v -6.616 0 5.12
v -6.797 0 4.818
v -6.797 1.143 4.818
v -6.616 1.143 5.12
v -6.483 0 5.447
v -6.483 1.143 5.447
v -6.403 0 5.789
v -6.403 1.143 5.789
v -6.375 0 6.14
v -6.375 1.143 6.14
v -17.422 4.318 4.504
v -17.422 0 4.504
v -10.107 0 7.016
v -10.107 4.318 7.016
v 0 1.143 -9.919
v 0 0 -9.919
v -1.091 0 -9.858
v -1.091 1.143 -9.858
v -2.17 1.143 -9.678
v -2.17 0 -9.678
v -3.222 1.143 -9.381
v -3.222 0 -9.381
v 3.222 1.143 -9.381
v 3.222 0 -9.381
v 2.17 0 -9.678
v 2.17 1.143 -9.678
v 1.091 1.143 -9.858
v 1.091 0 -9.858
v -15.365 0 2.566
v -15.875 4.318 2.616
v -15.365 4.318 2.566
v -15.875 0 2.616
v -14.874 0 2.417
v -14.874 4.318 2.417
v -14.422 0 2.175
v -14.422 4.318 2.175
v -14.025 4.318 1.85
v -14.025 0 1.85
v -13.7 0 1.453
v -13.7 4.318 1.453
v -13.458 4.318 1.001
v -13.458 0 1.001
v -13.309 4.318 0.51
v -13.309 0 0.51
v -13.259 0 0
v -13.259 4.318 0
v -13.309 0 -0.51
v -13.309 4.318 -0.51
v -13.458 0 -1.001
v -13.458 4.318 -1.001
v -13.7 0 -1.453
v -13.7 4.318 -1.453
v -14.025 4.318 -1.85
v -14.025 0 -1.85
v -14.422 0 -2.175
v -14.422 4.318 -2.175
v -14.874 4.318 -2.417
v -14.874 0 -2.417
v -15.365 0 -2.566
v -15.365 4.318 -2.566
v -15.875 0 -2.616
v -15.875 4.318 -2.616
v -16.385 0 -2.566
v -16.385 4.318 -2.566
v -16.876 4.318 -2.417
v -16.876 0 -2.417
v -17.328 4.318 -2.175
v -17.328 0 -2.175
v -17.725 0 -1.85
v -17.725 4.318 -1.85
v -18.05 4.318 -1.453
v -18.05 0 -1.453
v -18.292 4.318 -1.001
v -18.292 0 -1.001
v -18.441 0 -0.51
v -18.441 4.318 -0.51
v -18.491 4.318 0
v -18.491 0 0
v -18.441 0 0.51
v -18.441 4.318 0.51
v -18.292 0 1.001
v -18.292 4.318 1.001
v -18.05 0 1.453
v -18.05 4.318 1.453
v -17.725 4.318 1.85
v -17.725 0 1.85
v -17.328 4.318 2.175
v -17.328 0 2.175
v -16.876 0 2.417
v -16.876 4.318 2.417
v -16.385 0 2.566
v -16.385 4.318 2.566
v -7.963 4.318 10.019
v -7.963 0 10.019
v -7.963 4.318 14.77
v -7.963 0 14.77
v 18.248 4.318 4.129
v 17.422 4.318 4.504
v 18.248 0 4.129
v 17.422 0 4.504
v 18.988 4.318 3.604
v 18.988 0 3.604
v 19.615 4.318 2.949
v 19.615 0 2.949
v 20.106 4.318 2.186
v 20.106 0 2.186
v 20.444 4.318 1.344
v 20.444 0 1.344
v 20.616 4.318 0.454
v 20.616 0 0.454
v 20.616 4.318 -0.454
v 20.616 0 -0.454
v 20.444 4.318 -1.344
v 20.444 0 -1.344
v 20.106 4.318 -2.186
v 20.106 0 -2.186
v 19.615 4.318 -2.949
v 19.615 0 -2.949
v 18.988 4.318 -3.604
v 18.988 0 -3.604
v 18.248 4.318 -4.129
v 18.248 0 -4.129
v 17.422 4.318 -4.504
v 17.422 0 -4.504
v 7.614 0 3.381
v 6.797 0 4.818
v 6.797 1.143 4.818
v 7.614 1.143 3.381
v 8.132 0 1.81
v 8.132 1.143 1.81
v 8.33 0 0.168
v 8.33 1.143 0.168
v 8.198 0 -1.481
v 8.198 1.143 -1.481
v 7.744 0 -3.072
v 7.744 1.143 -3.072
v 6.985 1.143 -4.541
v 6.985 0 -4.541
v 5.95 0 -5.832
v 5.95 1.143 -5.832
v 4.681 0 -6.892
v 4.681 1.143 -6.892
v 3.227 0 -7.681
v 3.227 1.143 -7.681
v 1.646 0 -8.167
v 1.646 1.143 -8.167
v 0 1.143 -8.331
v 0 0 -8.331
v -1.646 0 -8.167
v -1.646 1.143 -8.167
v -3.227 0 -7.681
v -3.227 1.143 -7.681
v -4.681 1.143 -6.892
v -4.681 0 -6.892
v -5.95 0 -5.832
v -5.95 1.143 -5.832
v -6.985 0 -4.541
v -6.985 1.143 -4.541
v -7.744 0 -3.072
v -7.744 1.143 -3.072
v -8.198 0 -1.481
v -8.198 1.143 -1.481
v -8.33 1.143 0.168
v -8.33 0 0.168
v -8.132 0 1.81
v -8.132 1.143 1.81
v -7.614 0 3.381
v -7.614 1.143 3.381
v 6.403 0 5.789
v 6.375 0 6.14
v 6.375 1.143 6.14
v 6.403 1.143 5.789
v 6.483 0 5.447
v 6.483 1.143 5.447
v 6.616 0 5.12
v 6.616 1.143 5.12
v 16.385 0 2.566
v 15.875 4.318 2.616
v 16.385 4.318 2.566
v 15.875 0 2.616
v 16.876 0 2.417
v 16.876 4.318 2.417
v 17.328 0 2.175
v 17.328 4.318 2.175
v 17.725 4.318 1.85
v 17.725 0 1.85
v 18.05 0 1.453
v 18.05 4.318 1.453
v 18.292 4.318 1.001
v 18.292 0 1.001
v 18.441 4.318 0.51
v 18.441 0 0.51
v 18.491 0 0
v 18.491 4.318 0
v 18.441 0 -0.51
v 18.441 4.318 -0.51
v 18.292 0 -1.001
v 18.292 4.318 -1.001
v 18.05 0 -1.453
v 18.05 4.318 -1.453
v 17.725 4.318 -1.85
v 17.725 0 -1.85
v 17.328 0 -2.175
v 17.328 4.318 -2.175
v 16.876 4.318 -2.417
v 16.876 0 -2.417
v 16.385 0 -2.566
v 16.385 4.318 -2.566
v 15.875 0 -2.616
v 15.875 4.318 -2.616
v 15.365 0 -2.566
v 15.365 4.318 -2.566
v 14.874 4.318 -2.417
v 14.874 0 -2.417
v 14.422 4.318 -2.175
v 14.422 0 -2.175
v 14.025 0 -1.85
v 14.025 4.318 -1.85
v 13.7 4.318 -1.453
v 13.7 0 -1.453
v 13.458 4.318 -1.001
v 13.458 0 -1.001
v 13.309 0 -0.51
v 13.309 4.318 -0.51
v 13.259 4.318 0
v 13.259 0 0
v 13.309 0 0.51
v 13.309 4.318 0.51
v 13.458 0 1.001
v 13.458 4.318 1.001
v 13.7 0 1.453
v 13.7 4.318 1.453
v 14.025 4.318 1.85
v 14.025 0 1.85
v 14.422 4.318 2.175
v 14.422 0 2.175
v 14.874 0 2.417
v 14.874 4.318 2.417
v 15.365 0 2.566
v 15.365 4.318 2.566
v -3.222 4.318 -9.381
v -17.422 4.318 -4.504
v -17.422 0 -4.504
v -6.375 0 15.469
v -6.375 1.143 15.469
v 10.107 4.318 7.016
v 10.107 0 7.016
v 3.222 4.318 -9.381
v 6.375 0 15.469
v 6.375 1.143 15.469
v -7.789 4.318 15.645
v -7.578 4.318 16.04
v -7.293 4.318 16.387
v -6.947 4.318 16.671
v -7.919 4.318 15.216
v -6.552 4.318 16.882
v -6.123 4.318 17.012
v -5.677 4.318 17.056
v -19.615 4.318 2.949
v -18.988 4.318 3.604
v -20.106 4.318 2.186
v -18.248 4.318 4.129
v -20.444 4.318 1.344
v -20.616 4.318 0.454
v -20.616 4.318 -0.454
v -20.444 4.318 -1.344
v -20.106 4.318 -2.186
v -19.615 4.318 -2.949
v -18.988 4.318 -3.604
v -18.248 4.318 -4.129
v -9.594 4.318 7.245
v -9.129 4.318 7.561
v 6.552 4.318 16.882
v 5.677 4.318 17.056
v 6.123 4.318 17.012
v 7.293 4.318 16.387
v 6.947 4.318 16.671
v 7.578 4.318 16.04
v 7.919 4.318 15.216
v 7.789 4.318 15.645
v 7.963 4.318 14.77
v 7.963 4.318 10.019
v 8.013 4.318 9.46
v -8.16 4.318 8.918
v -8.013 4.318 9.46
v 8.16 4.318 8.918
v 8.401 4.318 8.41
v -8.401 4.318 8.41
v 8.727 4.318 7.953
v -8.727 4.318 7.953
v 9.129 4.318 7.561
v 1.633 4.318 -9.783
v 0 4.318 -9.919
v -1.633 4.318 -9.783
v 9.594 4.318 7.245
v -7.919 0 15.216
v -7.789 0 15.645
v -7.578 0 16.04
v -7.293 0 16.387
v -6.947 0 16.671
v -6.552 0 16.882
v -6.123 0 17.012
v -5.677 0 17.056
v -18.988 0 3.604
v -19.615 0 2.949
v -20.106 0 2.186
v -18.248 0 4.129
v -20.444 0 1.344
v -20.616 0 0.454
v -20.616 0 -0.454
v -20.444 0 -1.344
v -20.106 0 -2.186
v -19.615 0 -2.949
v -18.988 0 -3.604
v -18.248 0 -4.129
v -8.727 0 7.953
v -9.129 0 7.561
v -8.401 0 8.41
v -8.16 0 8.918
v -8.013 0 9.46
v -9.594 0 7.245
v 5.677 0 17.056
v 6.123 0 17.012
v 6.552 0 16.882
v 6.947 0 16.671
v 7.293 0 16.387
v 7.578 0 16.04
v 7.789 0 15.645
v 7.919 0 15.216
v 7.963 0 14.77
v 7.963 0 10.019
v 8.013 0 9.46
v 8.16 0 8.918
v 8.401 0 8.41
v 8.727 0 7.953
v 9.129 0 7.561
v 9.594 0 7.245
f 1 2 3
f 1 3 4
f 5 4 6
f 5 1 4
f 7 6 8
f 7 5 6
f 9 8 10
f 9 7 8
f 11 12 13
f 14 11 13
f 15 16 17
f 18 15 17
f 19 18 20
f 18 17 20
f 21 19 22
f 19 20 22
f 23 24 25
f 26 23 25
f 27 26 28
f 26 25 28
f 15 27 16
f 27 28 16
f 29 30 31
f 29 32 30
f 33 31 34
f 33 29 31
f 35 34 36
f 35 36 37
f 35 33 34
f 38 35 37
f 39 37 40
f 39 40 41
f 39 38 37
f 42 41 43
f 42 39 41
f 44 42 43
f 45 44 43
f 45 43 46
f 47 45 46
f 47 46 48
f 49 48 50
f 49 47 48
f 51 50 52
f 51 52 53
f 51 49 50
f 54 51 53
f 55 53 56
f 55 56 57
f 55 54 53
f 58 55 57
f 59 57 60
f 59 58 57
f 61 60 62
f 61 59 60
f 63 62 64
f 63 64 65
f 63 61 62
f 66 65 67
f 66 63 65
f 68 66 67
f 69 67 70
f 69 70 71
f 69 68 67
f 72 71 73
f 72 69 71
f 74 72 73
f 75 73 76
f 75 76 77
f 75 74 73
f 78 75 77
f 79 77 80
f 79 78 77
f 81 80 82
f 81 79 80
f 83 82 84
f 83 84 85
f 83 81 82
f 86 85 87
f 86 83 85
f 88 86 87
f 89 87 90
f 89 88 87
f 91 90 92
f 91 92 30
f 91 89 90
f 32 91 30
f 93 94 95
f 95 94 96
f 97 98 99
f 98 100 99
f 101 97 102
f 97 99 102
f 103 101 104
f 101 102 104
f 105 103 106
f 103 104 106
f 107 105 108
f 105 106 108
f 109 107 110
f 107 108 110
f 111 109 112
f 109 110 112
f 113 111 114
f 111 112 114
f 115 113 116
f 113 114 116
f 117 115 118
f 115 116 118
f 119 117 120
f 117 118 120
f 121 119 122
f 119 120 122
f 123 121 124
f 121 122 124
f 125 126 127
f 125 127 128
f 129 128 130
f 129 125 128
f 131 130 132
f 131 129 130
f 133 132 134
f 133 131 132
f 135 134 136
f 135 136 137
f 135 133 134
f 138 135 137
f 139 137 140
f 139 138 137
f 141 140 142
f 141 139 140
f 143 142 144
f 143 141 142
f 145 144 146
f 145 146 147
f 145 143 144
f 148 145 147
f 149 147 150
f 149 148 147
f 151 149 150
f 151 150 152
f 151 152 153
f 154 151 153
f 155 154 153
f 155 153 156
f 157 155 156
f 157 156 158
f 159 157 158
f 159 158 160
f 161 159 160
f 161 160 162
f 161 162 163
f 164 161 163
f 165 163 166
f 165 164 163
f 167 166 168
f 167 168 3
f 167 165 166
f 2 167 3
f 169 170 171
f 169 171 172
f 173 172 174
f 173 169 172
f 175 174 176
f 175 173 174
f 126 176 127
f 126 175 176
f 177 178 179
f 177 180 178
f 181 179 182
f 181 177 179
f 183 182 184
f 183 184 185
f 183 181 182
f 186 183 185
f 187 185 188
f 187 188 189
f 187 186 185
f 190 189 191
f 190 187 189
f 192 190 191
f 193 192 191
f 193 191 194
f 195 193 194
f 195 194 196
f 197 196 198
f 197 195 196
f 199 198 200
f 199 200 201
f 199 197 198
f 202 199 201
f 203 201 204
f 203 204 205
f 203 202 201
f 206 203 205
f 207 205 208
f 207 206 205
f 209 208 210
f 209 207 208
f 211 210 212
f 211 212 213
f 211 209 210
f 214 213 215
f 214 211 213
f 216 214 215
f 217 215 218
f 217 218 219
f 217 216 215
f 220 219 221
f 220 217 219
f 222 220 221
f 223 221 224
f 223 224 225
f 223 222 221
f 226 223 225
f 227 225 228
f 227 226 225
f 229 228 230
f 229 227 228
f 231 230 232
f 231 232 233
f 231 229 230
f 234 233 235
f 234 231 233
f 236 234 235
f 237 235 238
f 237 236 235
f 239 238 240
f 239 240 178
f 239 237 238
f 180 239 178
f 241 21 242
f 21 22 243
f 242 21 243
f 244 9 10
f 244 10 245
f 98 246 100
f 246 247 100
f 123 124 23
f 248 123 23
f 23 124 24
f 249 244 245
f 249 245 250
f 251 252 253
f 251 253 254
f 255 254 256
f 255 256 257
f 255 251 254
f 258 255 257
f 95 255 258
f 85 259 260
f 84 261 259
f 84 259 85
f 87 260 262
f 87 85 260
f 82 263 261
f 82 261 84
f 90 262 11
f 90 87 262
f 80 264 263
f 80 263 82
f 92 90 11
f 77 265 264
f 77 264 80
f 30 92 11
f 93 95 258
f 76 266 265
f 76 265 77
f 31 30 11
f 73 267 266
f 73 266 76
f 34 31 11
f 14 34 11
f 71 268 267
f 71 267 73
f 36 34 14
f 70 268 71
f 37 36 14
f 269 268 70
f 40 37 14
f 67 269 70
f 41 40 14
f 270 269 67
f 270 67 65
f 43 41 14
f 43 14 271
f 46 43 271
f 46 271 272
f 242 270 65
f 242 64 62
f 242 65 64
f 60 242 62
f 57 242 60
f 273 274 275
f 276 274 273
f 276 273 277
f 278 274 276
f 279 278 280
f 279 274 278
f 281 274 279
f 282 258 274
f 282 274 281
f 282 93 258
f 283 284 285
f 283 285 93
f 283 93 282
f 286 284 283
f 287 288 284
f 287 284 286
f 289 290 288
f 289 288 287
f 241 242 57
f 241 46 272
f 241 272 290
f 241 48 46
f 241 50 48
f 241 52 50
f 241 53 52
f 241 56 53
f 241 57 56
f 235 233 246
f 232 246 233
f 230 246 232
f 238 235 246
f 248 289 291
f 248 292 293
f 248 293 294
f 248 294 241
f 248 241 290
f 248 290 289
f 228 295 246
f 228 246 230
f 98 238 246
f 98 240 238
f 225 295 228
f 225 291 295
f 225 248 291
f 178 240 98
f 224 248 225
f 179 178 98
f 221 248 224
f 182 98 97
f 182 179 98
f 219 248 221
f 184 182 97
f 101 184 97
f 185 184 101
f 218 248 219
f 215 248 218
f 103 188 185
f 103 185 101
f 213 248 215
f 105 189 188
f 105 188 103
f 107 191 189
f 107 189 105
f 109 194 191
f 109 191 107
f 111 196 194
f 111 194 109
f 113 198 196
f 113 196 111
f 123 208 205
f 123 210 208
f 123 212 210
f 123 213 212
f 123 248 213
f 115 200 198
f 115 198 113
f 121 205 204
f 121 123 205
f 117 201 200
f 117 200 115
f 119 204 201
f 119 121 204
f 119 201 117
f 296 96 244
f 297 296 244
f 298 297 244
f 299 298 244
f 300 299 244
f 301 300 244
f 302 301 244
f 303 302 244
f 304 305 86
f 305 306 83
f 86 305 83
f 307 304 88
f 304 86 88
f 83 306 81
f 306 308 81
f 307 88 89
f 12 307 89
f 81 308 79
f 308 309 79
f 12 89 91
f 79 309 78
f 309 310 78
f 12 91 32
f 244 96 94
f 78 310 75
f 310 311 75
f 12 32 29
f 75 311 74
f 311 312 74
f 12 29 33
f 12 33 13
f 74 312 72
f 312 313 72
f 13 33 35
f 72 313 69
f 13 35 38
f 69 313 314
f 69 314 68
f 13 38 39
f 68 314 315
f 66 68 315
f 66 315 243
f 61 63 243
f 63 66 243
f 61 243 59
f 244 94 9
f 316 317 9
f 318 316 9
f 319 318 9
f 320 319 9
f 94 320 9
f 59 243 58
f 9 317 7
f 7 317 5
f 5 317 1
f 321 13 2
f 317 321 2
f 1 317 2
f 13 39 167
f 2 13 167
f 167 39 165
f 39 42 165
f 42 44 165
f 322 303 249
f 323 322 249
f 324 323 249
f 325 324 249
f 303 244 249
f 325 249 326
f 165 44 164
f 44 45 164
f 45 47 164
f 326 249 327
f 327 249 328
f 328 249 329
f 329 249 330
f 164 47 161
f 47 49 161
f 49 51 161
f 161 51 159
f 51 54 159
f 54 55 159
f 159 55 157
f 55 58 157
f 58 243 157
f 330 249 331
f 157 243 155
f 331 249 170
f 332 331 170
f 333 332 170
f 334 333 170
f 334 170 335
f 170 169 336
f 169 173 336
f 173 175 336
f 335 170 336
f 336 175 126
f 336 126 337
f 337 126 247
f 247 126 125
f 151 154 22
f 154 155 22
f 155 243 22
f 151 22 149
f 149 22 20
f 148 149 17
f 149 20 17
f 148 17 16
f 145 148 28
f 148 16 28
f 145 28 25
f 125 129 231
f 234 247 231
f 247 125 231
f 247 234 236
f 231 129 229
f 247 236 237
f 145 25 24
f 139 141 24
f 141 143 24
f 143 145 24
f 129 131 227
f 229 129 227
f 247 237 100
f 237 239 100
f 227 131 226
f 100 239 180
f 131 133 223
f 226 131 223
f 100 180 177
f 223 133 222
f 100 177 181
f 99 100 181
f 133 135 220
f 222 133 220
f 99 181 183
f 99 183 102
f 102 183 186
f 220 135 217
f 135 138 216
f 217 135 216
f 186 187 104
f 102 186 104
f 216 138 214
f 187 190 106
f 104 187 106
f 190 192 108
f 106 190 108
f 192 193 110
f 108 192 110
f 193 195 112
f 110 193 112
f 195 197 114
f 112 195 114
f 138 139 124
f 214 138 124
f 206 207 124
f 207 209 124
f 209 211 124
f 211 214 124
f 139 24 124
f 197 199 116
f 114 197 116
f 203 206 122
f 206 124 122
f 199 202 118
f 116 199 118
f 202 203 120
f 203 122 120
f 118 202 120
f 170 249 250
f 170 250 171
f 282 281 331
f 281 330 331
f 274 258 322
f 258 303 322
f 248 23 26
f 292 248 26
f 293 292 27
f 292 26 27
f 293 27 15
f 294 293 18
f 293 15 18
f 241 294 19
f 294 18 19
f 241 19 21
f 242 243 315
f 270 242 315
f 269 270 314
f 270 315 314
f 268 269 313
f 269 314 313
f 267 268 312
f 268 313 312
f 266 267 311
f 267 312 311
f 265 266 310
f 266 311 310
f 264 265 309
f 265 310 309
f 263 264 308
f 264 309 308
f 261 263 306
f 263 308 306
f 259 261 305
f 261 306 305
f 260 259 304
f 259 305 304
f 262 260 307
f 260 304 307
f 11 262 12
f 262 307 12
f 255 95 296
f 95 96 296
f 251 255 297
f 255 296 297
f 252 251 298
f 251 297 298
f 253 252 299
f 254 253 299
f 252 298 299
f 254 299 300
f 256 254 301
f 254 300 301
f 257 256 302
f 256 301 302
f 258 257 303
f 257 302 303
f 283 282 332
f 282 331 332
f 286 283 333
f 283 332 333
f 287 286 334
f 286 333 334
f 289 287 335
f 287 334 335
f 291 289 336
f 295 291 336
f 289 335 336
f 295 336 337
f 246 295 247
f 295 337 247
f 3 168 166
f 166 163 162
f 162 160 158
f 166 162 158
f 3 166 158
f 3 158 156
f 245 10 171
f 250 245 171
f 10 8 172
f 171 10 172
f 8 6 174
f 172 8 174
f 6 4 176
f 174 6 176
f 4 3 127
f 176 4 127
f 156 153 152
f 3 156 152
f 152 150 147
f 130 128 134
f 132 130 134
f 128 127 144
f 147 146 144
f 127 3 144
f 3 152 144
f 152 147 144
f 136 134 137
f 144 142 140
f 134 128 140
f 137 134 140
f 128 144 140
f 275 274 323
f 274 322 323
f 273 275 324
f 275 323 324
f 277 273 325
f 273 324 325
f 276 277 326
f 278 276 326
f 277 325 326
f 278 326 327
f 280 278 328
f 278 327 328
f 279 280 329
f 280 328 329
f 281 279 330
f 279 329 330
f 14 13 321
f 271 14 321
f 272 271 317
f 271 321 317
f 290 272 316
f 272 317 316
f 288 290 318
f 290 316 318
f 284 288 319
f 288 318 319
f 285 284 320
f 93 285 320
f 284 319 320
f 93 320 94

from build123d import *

# Parameters (mm, degrees)
BOSS_EXTRUDE1_DEPTH = 1.143
SKETCH2_R           = 2.6162
BOSS_EXTRUDE2_DEPTH = 3.175


with BuildPart() as part:
    # Sketch1 → Boss-Extrude1 (new body)
    with BuildSketch(Plane(origin=(0, 0, 0), x_dir=(1, 0, 0), z_dir=(0, 1, 0))):
        with BuildLine():
            Line((-7.9629, -10.019330915), (-7.9629, -14.7701))
            ThreePointArc((-7.9629, -14.7701), (-7.293346102, -16.386546102), (-5.6769, -17.0561))
            Line((-5.6769, -17.0561), (5.6769, -17.0561))
            ThreePointArc((5.6769, -17.0561), (7.293346102, -16.386546102), (7.9629, -14.7701))
            Line((7.9629, -14.7701), (7.9629, -10.019330915))
            ThreePointArc((7.9629, -10.019330915), (8.553832276, -8.174549356), (10.10666, -7.016470768))
            Line((10.10666, -7.016470768), (17.42186, -4.50429022))
            ThreePointArc((17.42186, -4.50429022), (20.6375, 0), (17.42186, 4.50429022))
            Line((17.42186, 4.50429022), (3.22159376, 9.380935099))
            ThreePointArc((3.22159376, 9.380935099), (1.633084309, 9.783335082), (0, 9.9187))
            ThreePointArc((0, 9.9187), (-1.633084309, 9.783335082), (-3.22159376, 9.380935099))
            Line((-3.22159376, 9.380935099), (-17.42186, 4.50429022))
            ThreePointArc((-17.42186, 4.50429022), (-20.6375, 0), (-17.42186, -4.50429022))
            Line((-17.42186, -4.50429022), (-10.10666, -7.016470768))
            ThreePointArc((-10.10666, -7.016470768), (-8.553832276, -8.174549356), (-7.9629, -10.019330915))
        make_face()
        with BuildLine():
            ThreePointArc((-15.875, 2.6162), (-18.4912, 0), (-15.875, -2.6162))
            ThreePointArc((-15.875, -2.6162), (-13.2588, 0), (-15.875, 2.6162))
        make_face(mode=Mode.SUBTRACT)
        with BuildLine():
            ThreePointArc((6.796505263, -4.818340964), (0, 8.3312), (-6.796505263, -4.818340964))
            ThreePointArc((-6.796505263, -4.818340964), (-6.483218951, -5.44667203), (-6.3754, -6.140446717))
            Line((-6.3754, -6.140446717), (-6.3754, -15.4686))
            Line((-6.3754, -15.4686), (6.3754, -15.4686))
            Line((6.3754, -15.4686), (6.3754, -9.7536))
            Line((6.3754, -9.7536), (6.3754, -6.140446717))
            ThreePointArc((6.3754, -6.140446717), (6.483218951, -5.44667203), (6.796505263, -4.818340964))
        make_face(mode=Mode.SUBTRACT)
        with BuildLine():
            ThreePointArc((15.875, 2.6162), (13.2588, 0), (15.875, -2.6162))
            ThreePointArc((15.875, -2.6162), (18.4912, 0), (15.875, 2.6162))
        make_face(mode=Mode.SUBTRACT)
    extrude(amount=BOSS_EXTRUDE1_DEPTH)

    # Sketch2 → Boss-Extrude2 (add)
    with BuildSketch(Plane(origin=(0, 1.143, 0), x_dir=(1, 0, 0), z_dir=(0, 1, 0))):
        with BuildLine():
            Line((-7.9629, -10.019330915), (-7.9629, -14.7701))
            ThreePointArc((-7.9629, -14.7701), (-7.293346102, -16.386546102), (-5.6769, -17.0561))
            Line((-5.6769, -17.0561), (5.6769, -17.0561))
            ThreePointArc((5.6769, -17.0561), (7.293346102, -16.386546102), (7.9629, -14.7701))
            Line((7.9629, -14.7701), (7.9629, -10.019330915))
            ThreePointArc((7.9629, -10.019330915), (8.553832276, -8.174549356), (10.10666, -7.016470768))
            Line((10.10666, -7.016470768), (17.42186, -4.50429022))
            ThreePointArc((17.42186, -4.50429022), (20.6375, 0), (17.42186, 4.50429022))
            Line((17.42186, 4.50429022), (3.22159376, 9.380935099))
            ThreePointArc((3.22159376, 9.380935099), (0, 9.9187), (-3.22159376, 9.380935099))
            Line((-3.22159376, 9.380935099), (-17.42186, 4.50429022))
            ThreePointArc((-17.42186, 4.50429022), (-20.6375, 0), (-17.42186, -4.50429022))
            Line((-17.42186, -4.50429022), (-10.10666, -7.016470768))
            ThreePointArc((-10.10666, -7.016470768), (-8.553832276, -8.174549356), (-7.9629, -10.019330915))
        make_face()
        with Locations(Location((15.875, 0, 0), (0, 0, 270))):
            Circle(SKETCH2_R, mode=Mode.SUBTRACT)
        with Locations(Location((-15.875, 0, 0), (0, 0, 270))):
            Circle(SKETCH2_R, mode=Mode.SUBTRACT)
    extrude(amount=BOSS_EXTRUDE2_DEPTH)


solid = part.part
